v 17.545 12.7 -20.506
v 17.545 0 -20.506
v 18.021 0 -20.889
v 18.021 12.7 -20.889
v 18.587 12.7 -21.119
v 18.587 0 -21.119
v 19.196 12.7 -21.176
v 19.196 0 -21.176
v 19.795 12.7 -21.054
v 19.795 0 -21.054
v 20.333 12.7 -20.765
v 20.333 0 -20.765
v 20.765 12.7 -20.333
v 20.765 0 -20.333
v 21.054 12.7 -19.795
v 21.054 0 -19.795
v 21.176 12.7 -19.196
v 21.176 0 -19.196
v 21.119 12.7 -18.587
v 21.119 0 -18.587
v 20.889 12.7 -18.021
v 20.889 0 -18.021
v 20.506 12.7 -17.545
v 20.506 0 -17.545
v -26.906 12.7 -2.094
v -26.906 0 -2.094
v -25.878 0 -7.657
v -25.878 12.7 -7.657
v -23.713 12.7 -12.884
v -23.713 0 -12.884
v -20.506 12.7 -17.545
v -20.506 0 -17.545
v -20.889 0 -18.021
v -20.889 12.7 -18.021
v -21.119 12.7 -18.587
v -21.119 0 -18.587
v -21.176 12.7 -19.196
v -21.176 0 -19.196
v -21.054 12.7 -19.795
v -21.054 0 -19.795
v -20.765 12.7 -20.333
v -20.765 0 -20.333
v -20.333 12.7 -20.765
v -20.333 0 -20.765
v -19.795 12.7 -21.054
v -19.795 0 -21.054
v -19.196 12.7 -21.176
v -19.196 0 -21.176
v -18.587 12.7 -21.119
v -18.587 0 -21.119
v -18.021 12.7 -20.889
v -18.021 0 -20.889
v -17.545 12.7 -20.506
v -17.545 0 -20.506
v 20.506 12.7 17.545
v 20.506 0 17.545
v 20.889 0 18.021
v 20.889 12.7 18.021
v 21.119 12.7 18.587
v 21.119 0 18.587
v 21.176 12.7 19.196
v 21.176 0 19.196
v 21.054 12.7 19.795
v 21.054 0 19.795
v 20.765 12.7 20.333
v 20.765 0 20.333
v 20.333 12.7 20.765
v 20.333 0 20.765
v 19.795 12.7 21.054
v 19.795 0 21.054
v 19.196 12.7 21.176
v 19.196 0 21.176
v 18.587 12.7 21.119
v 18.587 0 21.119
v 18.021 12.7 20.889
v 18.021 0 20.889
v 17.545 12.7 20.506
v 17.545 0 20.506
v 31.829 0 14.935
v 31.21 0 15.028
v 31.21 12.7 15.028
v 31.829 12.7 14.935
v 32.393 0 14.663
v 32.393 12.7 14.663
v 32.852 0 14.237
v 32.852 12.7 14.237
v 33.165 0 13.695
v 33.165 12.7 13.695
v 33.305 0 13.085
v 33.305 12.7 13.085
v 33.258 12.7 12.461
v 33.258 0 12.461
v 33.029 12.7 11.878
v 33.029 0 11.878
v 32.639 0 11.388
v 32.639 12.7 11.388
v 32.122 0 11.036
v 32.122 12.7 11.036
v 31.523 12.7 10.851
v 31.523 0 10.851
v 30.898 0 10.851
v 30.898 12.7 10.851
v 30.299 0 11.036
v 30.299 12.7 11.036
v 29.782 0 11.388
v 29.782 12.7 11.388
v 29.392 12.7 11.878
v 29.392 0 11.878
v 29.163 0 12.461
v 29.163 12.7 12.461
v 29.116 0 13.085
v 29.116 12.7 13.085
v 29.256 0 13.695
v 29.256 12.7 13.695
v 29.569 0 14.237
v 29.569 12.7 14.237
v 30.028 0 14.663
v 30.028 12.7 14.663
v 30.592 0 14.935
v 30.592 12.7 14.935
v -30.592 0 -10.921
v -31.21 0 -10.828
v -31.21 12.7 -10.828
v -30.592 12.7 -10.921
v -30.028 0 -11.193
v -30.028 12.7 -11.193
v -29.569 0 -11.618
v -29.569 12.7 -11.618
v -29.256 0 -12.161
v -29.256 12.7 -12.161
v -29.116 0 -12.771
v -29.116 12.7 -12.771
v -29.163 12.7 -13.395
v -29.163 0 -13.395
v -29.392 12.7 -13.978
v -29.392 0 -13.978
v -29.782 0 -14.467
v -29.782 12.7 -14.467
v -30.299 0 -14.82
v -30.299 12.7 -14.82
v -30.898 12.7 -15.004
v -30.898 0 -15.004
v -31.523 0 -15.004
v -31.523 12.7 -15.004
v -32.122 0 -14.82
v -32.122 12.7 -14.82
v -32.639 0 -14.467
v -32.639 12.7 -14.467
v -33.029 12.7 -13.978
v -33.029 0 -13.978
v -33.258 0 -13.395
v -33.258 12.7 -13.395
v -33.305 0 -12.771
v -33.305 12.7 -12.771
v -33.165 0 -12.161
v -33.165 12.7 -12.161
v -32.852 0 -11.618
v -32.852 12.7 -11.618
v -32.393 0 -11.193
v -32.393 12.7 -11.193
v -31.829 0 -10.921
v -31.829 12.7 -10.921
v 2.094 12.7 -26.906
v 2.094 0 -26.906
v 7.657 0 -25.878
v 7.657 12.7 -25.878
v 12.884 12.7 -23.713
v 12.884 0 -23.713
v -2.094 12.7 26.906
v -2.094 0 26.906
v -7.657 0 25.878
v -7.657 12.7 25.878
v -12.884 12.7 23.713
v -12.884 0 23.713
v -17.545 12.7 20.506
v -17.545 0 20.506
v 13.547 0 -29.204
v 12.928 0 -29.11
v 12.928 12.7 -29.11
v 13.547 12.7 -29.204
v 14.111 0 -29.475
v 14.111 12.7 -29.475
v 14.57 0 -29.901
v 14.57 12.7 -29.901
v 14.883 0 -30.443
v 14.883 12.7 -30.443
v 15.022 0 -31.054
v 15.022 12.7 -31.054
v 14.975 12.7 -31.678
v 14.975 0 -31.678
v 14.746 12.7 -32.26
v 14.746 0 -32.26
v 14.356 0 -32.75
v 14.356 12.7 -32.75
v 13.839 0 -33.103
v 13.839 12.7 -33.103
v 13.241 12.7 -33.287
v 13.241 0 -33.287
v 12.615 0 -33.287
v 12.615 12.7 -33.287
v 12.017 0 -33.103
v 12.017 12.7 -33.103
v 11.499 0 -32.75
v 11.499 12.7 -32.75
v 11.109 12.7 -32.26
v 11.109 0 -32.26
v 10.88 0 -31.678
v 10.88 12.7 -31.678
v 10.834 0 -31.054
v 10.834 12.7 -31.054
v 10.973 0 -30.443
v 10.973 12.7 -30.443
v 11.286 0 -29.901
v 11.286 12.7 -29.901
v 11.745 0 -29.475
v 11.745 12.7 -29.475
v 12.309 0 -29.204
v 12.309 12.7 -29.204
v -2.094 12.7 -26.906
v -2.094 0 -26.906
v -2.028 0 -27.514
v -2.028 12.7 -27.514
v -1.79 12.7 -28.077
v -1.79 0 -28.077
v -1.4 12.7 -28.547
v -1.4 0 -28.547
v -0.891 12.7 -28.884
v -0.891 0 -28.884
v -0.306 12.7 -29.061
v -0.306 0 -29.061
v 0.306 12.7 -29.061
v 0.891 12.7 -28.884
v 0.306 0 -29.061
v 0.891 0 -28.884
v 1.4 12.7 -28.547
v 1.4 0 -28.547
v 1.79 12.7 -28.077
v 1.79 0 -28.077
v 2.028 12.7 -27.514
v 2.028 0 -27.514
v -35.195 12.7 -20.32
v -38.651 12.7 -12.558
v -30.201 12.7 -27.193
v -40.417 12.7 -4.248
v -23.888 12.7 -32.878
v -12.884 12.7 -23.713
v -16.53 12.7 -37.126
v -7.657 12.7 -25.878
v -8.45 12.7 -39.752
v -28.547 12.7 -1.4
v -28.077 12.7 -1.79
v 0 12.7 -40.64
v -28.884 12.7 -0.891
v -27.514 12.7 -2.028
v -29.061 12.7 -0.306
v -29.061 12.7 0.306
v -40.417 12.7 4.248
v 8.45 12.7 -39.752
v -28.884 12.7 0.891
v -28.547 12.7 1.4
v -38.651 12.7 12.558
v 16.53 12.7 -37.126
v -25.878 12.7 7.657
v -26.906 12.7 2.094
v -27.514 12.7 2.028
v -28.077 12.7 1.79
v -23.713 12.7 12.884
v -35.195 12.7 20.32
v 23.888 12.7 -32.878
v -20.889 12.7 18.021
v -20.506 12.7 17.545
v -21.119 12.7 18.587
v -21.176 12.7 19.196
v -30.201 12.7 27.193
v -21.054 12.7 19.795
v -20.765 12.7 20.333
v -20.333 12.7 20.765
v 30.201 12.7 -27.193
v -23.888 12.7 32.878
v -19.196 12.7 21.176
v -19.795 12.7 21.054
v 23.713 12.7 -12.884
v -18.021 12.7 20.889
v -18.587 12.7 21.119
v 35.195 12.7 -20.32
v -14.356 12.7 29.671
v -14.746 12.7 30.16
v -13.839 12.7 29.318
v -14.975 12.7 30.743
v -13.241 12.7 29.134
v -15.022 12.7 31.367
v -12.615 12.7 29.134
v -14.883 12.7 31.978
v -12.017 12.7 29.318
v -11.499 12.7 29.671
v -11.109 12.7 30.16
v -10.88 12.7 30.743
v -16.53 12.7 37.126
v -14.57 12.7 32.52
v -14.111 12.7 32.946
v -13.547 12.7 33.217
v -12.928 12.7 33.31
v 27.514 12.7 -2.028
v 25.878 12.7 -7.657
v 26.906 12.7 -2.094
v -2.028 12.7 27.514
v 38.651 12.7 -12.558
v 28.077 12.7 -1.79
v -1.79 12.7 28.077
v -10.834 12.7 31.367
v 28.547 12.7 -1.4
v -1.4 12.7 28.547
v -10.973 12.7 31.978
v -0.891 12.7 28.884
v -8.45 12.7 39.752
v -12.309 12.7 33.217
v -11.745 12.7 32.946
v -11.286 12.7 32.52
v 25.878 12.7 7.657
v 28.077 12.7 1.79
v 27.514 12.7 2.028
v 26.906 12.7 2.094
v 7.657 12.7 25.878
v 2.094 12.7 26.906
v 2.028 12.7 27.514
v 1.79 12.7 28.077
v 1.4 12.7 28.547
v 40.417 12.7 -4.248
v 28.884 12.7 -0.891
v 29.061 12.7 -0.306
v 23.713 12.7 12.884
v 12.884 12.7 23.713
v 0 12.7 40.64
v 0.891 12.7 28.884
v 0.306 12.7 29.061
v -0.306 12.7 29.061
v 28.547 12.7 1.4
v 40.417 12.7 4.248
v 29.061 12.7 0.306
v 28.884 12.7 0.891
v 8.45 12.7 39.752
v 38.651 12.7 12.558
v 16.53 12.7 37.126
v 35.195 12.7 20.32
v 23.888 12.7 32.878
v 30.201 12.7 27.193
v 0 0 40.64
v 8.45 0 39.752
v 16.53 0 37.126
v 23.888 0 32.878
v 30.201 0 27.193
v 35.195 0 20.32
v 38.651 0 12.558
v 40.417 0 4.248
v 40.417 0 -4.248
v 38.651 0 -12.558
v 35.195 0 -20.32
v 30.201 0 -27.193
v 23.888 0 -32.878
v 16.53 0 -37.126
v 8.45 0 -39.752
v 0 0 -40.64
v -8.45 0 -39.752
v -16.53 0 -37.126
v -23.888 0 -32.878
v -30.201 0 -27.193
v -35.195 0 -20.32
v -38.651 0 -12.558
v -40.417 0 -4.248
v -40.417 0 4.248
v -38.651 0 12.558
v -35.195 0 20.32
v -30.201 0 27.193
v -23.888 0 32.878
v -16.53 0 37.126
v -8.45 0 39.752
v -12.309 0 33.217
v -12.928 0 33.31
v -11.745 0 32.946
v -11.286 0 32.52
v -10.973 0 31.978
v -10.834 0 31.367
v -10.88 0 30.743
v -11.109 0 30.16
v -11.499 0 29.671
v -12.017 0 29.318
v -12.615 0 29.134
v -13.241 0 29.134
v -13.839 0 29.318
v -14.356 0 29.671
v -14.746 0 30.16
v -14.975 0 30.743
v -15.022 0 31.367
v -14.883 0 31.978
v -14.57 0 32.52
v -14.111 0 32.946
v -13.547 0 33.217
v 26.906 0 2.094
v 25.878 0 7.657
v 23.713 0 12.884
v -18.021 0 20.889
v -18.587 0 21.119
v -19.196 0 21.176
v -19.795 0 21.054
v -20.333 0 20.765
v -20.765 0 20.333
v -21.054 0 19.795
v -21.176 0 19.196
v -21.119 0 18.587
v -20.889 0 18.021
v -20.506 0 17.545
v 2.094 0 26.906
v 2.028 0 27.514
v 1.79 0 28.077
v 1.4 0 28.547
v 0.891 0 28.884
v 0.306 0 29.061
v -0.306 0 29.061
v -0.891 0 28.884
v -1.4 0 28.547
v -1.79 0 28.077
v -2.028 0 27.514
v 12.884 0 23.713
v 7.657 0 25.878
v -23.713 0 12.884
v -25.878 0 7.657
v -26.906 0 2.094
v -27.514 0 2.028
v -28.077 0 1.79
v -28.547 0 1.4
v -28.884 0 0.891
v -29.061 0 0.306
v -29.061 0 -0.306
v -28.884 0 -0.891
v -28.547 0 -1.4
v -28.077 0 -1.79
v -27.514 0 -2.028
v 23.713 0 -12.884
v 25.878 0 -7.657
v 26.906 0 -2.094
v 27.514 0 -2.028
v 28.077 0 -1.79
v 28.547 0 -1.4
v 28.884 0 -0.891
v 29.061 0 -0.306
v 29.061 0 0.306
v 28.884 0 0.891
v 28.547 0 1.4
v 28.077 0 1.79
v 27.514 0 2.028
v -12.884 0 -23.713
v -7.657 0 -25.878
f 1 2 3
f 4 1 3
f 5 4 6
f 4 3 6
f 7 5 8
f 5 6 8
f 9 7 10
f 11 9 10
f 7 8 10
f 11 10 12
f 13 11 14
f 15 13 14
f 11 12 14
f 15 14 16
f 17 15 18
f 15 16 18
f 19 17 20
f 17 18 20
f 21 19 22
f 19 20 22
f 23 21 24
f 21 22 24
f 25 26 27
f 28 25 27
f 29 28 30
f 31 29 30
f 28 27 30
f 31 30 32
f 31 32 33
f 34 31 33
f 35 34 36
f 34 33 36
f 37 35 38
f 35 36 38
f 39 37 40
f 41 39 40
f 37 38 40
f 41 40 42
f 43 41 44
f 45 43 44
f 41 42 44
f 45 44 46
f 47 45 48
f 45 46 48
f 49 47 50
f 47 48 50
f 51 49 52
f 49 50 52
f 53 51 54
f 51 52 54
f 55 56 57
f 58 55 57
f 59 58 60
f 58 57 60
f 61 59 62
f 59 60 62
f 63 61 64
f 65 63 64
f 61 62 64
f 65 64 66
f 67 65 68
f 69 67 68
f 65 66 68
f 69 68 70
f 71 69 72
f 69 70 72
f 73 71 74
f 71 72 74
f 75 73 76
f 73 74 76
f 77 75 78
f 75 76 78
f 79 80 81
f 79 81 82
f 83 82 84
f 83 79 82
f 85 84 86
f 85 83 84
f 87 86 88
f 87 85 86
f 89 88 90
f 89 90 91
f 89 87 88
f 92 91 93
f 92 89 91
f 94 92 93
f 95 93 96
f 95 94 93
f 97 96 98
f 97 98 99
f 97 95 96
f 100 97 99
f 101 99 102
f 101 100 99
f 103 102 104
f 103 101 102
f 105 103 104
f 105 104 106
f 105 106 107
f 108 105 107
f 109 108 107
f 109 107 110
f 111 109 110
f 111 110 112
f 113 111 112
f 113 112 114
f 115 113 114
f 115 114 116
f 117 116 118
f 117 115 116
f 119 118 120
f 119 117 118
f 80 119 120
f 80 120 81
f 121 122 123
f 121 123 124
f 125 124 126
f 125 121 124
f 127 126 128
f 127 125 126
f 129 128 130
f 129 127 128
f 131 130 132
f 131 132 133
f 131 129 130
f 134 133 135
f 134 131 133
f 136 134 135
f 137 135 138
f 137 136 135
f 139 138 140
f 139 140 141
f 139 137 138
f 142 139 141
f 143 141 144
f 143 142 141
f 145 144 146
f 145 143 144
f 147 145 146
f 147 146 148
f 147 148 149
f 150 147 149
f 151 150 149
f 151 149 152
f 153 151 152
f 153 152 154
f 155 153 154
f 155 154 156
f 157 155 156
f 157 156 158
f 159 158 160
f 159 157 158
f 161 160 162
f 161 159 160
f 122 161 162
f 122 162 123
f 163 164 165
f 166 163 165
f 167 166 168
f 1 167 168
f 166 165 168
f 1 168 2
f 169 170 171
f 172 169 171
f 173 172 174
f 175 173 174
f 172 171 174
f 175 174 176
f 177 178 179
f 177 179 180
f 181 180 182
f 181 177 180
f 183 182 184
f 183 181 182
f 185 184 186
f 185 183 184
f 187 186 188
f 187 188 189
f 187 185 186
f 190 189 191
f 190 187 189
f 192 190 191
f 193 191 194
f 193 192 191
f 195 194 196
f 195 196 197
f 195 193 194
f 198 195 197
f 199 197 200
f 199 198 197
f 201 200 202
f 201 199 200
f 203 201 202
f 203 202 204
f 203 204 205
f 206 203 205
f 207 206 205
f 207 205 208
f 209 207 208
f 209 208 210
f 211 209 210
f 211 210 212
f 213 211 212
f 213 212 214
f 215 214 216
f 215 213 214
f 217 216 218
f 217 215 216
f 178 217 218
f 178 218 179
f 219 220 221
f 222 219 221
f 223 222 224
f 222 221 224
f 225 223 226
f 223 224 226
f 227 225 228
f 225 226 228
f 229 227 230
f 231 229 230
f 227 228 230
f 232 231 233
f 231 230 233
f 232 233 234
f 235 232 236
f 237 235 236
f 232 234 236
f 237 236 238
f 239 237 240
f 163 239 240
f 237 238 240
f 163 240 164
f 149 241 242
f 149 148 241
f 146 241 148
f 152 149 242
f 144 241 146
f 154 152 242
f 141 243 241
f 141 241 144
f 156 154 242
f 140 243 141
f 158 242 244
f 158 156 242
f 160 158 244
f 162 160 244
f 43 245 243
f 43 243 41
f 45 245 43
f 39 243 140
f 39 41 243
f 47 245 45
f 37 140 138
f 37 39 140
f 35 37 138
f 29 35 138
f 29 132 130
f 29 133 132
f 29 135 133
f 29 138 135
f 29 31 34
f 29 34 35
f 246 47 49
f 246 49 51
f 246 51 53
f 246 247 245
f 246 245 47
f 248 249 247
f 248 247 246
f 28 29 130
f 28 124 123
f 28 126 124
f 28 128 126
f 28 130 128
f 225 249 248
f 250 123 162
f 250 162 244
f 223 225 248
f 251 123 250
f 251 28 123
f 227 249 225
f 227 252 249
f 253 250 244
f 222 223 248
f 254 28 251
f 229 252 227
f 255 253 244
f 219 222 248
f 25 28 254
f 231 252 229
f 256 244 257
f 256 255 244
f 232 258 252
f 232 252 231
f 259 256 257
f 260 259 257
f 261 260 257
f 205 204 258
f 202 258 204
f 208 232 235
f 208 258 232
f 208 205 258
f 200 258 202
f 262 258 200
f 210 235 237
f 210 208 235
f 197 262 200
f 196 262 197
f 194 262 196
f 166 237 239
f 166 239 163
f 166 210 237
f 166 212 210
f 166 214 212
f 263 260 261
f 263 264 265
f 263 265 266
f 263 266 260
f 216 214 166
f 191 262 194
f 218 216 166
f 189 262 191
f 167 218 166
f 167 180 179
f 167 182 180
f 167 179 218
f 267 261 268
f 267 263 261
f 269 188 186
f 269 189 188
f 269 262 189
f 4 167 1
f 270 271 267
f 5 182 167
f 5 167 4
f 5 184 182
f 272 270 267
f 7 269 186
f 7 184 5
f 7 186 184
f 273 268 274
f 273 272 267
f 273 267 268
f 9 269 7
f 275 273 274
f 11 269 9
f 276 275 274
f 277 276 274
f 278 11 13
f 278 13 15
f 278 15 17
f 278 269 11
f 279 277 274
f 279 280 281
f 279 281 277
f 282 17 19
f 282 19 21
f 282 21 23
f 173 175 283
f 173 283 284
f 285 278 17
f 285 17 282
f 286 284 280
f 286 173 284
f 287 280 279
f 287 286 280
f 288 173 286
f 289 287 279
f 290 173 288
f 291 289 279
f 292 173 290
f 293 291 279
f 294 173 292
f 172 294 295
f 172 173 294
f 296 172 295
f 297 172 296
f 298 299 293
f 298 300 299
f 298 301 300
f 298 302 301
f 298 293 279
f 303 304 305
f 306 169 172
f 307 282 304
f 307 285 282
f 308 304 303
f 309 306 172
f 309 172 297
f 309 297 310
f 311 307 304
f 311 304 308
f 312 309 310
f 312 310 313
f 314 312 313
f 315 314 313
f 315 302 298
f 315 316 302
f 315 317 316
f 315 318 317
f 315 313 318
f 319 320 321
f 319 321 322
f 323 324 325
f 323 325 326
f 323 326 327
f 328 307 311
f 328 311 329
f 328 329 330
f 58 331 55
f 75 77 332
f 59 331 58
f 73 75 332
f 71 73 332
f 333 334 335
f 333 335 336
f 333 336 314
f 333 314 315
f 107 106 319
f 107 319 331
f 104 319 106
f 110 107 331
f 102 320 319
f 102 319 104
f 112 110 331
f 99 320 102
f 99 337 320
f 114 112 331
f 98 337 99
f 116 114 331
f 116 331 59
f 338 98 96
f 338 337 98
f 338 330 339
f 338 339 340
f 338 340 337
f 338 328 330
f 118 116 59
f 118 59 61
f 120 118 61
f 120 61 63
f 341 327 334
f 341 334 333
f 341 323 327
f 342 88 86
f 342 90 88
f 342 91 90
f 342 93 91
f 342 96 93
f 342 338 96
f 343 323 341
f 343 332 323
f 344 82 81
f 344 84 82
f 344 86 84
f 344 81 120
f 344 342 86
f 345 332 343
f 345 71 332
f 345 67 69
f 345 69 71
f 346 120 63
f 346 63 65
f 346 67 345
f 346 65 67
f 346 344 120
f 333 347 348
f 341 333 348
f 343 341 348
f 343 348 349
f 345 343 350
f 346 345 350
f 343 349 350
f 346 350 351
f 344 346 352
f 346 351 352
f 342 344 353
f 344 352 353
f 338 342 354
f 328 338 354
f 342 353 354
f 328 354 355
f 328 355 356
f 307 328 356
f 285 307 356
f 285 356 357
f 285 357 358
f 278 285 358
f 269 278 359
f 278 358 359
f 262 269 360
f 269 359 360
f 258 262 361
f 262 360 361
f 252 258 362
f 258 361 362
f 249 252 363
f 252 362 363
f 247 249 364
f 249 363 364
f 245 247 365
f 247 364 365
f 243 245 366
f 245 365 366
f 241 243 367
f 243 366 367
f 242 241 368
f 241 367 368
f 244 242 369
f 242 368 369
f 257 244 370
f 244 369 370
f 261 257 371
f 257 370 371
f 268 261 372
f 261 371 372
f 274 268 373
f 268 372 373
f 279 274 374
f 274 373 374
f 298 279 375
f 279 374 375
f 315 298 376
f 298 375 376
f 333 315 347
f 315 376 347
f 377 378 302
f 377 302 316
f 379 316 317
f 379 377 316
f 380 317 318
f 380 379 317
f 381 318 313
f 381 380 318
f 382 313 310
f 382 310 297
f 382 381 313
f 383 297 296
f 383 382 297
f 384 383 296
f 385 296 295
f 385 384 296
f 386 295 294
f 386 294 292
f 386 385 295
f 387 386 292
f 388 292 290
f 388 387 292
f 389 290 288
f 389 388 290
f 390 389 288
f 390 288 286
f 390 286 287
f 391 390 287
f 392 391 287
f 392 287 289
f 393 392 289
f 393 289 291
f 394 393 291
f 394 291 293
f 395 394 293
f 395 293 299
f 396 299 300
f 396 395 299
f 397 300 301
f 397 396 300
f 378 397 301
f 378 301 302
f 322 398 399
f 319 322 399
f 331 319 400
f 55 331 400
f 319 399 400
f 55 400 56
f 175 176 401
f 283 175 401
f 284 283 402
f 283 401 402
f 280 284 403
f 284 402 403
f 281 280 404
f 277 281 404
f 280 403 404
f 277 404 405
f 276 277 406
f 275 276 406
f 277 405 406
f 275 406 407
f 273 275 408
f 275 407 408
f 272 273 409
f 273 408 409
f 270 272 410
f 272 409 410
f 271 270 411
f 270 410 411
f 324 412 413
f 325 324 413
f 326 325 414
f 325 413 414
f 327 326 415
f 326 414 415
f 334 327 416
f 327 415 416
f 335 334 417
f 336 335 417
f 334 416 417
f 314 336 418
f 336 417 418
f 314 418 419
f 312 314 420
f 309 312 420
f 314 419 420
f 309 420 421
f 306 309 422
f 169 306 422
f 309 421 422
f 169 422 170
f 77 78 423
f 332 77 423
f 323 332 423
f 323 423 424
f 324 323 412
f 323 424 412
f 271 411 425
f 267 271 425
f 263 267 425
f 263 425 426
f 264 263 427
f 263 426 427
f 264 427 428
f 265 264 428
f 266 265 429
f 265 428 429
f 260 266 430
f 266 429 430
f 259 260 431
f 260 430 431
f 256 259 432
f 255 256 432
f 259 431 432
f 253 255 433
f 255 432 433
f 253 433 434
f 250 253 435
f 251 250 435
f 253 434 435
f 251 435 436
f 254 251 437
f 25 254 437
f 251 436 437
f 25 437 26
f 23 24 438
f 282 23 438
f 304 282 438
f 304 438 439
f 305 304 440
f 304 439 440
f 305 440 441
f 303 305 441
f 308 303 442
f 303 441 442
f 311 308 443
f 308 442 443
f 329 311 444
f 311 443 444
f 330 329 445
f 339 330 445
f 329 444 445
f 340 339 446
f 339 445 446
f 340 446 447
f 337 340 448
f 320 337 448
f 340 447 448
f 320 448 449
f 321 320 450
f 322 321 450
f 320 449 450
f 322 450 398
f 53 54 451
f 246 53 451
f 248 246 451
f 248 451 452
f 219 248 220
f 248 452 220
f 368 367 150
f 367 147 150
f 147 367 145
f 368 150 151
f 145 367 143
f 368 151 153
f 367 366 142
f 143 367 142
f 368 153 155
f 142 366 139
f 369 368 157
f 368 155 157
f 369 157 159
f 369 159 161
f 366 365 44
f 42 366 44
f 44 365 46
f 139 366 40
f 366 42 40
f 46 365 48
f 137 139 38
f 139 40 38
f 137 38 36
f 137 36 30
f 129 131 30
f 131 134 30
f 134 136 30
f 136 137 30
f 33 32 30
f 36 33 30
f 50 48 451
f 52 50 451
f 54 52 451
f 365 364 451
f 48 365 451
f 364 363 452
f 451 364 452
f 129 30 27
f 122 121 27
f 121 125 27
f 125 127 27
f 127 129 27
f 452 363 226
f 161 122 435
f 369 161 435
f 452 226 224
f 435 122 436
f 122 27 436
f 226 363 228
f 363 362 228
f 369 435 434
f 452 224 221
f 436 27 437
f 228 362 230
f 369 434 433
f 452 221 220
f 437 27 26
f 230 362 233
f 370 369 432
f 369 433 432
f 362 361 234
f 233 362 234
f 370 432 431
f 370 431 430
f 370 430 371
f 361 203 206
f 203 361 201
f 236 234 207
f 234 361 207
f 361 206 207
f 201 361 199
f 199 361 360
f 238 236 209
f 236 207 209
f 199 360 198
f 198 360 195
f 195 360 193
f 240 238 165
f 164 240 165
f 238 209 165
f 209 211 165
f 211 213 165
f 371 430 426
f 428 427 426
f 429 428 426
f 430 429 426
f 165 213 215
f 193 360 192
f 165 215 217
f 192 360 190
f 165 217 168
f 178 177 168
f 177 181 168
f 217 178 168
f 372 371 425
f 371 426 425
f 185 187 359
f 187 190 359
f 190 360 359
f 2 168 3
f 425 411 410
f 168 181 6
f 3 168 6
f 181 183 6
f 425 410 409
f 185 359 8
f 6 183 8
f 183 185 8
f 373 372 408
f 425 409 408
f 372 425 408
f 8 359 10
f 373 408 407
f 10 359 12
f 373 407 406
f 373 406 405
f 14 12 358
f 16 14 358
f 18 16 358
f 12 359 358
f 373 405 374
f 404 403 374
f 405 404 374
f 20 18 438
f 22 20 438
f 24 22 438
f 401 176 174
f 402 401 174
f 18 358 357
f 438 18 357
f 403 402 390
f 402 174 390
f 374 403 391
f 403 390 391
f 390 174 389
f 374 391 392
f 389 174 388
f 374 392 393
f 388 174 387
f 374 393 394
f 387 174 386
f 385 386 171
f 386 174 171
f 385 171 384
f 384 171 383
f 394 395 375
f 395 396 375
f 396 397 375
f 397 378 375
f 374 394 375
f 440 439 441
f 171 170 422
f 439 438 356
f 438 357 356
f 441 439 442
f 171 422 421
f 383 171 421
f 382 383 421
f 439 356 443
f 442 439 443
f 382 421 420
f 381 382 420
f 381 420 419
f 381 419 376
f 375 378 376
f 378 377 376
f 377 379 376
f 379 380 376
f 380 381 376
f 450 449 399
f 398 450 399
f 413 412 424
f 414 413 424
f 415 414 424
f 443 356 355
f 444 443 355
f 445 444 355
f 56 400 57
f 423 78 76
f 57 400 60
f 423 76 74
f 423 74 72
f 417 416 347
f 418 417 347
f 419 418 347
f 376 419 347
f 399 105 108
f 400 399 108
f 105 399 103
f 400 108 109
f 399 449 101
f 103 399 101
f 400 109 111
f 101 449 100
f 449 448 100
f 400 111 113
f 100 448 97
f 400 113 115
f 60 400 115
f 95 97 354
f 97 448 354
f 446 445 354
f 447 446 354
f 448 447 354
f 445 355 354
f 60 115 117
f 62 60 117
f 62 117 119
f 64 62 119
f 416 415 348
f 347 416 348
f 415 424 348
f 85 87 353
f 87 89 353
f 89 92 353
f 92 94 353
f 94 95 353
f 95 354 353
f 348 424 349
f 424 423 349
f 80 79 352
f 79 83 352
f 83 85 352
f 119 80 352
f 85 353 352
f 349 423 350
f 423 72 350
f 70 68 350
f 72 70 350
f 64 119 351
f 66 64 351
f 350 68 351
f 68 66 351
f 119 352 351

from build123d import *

# Parameters (mm, degrees)
F_1_5IN_SOCKET_R    = 40.64
F_1_5IN_SOCKET_R_2  = 2.1
BOSS_EXTRUDE1_DEPTH = 12.7


with BuildPart() as part:
    # 1.5in Socket → Boss-Extrude1 (new body)
    with BuildSketch(Plane(origin=(0, 0, 0), x_dir=(1, 0, 0), z_dir=(0, 1, 0))):
        with Locations(Location((0, 0, 0), (0, 0, 270))):
            Circle(F_1_5IN_SOCKET_R)
        with Locations(Location((12.927811712, 31.210498367, 0), (0, 0, 270))):
            Circle(F_1_5IN_SOCKET_R_2, mode=Mode.SUBTRACT)
        with Locations(Location((31.210498367, -12.927811712, 0), (0, 0, 270))):
            Circle(F_1_5IN_SOCKET_R_2, mode=Mode.SUBTRACT)
        with Locations(Location((-31.210498367, 12.927811712, 0), (0, 0, 270))):
            Circle(F_1_5IN_SOCKET_R_2, mode=Mode.SUBTRACT)
        with Locations(Location((-12.927811712, -31.210498367, 0), (0, 0, 270))):
            Circle(F_1_5IN_SOCKET_R_2, mode=Mode.SUBTRACT)
        with BuildLine():
            ThreePointArc((-20.506142942, 17.544892644), (-20.564786517, 20.564786517), (-17.544892644, 20.506142942))
            ThreePointArc((-17.544892644, 20.506142942), (-10.327669131, 24.933198884), (-2.093920166, 26.906145294))
            ThreePointArc((-2.093920166, 26.906145294), (0, 29.083), (2.093920166, 26.906145294))
            ThreePointArc((2.093920166, 26.906145294), (10.327669131, 24.933198884), (17.544892644, 20.506142942))
            ThreePointArc((17.544892644, 20.506142942), (20.564786517, 20.564786517), (20.506142942, 17.544892644))
            ThreePointArc((20.506142942, 17.544892644), (24.933198884, 10.327669131), (26.906145294, 2.093920166))
            ThreePointArc((26.906145294, 2.093920166), (29.083, 0), (26.906145294, -2.093920166))
            ThreePointArc((26.906145294, -2.093920166), (24.933198884, -10.327669131), (20.506142942, -17.544892644))
            ThreePointArc((20.506142942, -17.544892644), (20.564786517, -20.564786517), (17.544892644, -20.506142942))
            ThreePointArc((17.544892644, -20.506142942), (10.327669131, -24.933198884), (2.093920166, -26.906145294))
            ThreePointArc((2.093920166, -26.906145294), (0, -29.083), (-2.093920166, -26.906145294))
            ThreePointArc((-2.093920166, -26.906145294), (-10.327669131, -24.933198884), (-17.544892644, -20.506142942))
            ThreePointArc((-17.544892644, -20.506142942), (-20.564786517, -20.564786517), (-20.506142942, -17.544892644))
            ThreePointArc((-20.506142942, -17.544892644), (-24.933198884, -10.327669131), (-26.906145294, -2.093920166))
            ThreePointArc((-26.906145294, -2.093920166), (-29.083, 0), (-26.906145294, 2.093920166))
            ThreePointArc((-26.906145294, 2.093920166), (-24.933198884, 10.327669131), (-20.506142942, 17.544892644))
        make_face(mode=Mode.SUBTRACT)
    extrude(amount=BOSS_EXTRUDE1_DEPTH)


solid = part.part
